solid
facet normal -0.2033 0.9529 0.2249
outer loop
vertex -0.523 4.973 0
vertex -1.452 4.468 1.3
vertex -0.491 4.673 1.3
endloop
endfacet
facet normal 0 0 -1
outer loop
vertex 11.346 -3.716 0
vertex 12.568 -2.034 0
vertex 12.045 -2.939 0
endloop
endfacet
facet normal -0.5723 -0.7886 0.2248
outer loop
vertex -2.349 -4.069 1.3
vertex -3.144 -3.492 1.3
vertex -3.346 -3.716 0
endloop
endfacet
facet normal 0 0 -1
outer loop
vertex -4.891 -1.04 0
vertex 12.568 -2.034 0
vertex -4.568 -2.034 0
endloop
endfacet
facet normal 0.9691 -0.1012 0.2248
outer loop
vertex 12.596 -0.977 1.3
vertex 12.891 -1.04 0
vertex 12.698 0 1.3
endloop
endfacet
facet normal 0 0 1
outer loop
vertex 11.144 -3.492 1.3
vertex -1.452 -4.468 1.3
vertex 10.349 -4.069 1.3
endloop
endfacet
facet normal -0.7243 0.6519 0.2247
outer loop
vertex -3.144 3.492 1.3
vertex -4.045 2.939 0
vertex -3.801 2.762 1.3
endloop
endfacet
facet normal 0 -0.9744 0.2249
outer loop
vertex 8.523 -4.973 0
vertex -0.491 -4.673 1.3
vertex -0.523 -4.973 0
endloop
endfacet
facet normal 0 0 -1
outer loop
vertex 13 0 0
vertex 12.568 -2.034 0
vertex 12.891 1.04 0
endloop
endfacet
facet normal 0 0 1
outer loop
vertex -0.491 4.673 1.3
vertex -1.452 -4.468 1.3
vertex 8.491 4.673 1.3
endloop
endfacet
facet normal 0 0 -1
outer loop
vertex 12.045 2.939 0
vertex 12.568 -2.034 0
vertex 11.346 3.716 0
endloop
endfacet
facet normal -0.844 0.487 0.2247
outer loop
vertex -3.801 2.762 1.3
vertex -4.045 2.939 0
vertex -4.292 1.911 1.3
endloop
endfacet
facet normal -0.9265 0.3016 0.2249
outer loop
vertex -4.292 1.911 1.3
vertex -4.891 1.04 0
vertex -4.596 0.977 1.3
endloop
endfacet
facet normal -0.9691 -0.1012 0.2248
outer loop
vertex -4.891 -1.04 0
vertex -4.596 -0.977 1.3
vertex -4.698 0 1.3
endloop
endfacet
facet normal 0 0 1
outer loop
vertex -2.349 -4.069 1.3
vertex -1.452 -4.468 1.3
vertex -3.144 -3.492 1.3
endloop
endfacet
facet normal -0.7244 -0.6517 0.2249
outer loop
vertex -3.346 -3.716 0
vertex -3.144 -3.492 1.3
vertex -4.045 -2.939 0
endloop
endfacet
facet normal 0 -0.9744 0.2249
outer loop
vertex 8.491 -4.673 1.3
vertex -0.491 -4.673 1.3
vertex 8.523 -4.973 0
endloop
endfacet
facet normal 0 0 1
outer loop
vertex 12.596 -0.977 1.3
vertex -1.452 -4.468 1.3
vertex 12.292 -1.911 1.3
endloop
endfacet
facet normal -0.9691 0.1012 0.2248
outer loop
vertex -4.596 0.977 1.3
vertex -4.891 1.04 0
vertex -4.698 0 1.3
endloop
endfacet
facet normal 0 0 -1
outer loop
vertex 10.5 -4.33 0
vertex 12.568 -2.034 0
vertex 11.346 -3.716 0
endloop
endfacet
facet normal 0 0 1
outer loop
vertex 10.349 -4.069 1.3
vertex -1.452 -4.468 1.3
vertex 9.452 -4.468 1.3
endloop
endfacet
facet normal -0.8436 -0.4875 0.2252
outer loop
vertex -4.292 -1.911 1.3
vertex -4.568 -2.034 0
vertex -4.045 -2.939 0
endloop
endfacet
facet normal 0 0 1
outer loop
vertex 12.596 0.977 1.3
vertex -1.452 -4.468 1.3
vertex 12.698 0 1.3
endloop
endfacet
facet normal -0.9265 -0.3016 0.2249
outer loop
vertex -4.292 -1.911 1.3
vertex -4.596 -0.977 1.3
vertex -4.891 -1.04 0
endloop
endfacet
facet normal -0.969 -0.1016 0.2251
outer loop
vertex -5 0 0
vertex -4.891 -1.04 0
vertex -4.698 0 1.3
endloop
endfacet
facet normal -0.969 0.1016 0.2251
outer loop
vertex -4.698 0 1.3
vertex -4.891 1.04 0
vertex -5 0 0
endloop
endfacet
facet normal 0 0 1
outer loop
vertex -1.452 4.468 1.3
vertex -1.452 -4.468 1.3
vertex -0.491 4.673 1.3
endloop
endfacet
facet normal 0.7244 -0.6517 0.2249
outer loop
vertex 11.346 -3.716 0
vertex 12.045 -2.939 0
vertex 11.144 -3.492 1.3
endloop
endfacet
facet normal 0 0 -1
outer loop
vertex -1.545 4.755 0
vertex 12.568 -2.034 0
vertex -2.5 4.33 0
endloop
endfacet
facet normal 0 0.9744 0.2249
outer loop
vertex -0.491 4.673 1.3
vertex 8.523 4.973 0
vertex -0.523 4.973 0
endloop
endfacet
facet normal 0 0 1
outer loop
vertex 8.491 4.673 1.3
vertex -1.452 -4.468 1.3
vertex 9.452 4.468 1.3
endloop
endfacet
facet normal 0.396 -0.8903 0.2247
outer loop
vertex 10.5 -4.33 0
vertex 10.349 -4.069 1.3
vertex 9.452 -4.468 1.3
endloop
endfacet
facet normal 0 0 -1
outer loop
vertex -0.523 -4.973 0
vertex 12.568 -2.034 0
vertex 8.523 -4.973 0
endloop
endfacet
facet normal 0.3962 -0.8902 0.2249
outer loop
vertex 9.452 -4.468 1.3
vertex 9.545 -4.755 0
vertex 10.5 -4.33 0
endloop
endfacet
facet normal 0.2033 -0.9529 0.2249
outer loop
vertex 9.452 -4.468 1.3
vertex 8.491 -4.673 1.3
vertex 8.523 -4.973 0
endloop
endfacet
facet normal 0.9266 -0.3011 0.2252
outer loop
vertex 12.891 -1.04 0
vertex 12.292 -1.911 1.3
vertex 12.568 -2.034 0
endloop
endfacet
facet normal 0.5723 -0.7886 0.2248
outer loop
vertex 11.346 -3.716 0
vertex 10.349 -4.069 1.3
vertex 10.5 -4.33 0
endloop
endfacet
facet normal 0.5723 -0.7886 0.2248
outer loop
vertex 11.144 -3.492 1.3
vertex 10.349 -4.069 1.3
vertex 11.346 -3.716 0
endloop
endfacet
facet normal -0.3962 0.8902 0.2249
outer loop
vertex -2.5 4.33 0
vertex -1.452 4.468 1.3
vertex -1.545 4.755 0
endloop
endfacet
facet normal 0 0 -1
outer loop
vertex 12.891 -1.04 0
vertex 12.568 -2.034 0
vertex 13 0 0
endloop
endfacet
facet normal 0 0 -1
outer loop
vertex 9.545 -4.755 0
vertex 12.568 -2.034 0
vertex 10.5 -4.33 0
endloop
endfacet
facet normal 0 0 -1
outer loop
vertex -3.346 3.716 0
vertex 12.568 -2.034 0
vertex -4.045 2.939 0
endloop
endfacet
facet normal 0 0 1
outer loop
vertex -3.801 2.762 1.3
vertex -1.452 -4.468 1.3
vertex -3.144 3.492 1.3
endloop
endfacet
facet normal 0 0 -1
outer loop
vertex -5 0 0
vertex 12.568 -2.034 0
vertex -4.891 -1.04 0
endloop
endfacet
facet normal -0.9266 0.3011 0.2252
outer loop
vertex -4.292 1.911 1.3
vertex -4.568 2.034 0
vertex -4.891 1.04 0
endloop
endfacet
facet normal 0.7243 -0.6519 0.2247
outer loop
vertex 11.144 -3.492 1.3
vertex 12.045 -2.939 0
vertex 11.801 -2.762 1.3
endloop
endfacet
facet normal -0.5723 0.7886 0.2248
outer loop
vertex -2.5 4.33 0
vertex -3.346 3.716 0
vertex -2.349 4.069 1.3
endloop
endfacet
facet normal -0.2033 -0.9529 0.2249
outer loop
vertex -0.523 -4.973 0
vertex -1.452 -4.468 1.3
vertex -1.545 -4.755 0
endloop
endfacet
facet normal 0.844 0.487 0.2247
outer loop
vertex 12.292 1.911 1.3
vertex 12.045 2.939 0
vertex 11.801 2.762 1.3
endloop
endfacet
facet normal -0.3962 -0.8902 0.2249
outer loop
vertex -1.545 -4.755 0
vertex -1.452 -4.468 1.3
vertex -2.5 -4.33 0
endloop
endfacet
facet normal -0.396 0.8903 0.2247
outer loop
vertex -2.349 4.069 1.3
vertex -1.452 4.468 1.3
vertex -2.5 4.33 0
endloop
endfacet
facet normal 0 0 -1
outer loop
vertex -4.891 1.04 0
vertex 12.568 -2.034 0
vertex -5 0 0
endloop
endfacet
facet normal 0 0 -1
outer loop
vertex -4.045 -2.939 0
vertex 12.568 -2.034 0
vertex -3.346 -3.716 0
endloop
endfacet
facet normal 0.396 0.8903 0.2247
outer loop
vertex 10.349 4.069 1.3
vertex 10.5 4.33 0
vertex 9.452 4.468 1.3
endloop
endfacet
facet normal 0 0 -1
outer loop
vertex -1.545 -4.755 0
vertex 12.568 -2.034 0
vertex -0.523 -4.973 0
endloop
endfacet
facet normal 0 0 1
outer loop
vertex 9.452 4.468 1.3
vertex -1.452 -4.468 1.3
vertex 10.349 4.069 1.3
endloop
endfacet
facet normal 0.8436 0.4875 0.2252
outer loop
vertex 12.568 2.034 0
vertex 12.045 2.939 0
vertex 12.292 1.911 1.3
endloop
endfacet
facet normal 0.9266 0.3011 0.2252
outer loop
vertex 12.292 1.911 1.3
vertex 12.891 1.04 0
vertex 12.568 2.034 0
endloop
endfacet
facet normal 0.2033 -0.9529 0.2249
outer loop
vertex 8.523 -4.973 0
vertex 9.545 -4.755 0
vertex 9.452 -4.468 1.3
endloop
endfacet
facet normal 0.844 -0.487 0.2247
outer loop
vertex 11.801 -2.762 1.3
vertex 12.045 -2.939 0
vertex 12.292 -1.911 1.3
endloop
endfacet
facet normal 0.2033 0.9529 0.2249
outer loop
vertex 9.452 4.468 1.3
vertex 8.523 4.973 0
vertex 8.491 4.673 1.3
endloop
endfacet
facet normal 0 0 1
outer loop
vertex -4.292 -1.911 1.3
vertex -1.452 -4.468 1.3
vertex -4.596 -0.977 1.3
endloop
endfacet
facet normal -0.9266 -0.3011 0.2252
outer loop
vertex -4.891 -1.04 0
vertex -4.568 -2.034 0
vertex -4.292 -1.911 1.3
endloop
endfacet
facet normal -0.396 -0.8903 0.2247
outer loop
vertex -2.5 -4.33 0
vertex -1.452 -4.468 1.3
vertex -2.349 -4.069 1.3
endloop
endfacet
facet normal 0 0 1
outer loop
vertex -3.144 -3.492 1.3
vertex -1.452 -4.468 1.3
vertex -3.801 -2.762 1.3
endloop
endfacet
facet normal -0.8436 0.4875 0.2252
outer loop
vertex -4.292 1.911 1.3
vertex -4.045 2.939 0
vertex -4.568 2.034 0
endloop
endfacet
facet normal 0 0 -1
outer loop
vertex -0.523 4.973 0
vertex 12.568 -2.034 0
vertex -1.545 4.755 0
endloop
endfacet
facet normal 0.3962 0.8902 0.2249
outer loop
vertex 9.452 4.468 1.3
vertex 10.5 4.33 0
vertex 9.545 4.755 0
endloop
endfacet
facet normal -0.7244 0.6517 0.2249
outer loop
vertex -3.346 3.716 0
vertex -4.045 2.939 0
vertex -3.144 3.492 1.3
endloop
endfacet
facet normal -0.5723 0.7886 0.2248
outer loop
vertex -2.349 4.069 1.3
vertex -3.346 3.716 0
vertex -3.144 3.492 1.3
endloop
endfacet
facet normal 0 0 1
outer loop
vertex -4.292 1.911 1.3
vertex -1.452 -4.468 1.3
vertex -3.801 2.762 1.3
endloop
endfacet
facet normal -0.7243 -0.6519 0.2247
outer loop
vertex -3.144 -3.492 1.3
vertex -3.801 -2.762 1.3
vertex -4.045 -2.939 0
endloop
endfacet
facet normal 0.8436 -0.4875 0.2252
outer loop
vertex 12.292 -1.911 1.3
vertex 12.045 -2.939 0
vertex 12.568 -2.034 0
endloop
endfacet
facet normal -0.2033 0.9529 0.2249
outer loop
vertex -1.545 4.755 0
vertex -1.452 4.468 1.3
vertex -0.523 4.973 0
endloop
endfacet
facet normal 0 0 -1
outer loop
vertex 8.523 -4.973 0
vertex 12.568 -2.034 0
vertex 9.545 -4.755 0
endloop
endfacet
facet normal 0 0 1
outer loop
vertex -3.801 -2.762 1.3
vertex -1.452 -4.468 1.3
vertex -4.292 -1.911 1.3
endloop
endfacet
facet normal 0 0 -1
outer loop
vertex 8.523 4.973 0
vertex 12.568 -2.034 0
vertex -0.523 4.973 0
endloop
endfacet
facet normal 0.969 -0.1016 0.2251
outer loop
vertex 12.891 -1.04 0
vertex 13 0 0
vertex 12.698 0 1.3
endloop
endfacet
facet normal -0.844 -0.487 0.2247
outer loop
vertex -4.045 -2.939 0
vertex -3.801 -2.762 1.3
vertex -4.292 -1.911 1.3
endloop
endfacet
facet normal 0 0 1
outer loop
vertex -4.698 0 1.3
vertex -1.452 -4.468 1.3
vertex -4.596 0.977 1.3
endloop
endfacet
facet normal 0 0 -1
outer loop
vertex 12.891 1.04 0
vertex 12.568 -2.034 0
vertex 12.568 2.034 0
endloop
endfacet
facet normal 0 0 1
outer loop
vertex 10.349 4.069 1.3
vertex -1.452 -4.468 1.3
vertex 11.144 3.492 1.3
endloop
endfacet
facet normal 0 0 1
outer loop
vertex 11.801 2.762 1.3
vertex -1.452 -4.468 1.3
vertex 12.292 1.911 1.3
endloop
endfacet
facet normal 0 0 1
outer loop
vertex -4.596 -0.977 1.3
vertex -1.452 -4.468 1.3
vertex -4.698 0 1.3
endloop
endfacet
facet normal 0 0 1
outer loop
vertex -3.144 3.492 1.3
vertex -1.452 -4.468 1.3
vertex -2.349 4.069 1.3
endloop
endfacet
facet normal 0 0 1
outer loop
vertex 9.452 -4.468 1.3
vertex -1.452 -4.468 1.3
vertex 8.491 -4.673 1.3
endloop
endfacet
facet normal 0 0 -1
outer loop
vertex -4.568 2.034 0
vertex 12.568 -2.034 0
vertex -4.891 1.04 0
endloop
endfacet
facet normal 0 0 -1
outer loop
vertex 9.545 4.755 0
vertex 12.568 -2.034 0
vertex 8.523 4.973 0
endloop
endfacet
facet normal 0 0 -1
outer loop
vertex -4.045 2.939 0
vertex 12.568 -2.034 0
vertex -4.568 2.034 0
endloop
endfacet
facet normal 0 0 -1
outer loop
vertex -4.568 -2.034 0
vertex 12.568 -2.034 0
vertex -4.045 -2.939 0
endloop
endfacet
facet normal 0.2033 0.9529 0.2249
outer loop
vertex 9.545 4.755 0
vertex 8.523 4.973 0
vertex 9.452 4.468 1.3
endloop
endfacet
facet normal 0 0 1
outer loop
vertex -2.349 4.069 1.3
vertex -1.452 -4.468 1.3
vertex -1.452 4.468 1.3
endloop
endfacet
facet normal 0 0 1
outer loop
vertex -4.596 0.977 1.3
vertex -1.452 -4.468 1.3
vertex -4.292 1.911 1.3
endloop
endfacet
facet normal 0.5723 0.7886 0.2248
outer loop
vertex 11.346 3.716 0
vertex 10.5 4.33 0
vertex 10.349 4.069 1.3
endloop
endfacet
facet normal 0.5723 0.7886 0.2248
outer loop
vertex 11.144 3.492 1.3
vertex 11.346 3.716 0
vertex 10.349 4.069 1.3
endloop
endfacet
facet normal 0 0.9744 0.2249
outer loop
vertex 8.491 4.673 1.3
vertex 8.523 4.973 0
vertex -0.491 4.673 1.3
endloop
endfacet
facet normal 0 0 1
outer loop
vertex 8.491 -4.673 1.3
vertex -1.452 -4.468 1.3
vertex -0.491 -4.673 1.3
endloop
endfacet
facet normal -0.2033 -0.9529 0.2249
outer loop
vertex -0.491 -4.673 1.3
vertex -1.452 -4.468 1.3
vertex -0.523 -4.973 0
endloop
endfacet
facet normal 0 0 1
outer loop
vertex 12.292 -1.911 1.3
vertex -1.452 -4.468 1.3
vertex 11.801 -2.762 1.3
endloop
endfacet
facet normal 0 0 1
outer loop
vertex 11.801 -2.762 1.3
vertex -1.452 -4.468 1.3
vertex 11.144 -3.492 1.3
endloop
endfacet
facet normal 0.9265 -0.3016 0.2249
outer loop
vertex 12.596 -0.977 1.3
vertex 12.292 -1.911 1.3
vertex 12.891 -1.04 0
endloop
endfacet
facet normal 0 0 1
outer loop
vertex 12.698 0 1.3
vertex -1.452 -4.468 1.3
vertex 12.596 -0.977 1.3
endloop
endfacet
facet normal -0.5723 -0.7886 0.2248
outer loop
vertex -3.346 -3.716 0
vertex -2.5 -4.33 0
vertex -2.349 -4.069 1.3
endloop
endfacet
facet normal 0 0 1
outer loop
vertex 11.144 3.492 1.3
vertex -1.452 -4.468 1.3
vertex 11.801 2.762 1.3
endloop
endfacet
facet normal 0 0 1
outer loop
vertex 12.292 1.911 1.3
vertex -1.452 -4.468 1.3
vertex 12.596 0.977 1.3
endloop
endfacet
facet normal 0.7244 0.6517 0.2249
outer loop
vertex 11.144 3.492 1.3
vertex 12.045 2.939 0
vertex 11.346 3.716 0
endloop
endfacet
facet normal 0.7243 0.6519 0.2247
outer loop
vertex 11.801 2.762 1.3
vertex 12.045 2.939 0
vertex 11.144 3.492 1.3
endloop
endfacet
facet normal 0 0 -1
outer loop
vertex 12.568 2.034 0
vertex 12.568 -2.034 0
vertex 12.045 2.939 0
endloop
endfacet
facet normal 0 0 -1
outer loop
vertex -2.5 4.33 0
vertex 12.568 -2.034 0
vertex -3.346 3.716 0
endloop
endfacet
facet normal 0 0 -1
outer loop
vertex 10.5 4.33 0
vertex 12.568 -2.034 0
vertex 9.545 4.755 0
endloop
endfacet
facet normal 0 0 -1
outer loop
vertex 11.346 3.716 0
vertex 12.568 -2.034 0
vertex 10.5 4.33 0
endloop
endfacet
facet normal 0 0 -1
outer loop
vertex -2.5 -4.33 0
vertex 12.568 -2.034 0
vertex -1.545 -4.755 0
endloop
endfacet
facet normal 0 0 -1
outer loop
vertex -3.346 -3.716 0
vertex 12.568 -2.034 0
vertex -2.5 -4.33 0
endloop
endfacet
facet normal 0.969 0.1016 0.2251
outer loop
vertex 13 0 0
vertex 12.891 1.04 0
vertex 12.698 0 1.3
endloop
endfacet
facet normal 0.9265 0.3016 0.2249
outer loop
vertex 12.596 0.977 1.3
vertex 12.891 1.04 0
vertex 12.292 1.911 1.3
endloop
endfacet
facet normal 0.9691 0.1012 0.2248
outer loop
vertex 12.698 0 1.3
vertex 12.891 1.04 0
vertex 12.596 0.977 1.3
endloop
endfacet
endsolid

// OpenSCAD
$fn = 30;

module profile() {
  circle(d=10);
  translate([8, 0])
    circle(d=10);
}

hull() {
  linear_extrude(0.00001)
    profile();
  translate([0, 0, 1.3])
    linear_extrude(0.00001)
      offset(-0.3)
        profile();
}
